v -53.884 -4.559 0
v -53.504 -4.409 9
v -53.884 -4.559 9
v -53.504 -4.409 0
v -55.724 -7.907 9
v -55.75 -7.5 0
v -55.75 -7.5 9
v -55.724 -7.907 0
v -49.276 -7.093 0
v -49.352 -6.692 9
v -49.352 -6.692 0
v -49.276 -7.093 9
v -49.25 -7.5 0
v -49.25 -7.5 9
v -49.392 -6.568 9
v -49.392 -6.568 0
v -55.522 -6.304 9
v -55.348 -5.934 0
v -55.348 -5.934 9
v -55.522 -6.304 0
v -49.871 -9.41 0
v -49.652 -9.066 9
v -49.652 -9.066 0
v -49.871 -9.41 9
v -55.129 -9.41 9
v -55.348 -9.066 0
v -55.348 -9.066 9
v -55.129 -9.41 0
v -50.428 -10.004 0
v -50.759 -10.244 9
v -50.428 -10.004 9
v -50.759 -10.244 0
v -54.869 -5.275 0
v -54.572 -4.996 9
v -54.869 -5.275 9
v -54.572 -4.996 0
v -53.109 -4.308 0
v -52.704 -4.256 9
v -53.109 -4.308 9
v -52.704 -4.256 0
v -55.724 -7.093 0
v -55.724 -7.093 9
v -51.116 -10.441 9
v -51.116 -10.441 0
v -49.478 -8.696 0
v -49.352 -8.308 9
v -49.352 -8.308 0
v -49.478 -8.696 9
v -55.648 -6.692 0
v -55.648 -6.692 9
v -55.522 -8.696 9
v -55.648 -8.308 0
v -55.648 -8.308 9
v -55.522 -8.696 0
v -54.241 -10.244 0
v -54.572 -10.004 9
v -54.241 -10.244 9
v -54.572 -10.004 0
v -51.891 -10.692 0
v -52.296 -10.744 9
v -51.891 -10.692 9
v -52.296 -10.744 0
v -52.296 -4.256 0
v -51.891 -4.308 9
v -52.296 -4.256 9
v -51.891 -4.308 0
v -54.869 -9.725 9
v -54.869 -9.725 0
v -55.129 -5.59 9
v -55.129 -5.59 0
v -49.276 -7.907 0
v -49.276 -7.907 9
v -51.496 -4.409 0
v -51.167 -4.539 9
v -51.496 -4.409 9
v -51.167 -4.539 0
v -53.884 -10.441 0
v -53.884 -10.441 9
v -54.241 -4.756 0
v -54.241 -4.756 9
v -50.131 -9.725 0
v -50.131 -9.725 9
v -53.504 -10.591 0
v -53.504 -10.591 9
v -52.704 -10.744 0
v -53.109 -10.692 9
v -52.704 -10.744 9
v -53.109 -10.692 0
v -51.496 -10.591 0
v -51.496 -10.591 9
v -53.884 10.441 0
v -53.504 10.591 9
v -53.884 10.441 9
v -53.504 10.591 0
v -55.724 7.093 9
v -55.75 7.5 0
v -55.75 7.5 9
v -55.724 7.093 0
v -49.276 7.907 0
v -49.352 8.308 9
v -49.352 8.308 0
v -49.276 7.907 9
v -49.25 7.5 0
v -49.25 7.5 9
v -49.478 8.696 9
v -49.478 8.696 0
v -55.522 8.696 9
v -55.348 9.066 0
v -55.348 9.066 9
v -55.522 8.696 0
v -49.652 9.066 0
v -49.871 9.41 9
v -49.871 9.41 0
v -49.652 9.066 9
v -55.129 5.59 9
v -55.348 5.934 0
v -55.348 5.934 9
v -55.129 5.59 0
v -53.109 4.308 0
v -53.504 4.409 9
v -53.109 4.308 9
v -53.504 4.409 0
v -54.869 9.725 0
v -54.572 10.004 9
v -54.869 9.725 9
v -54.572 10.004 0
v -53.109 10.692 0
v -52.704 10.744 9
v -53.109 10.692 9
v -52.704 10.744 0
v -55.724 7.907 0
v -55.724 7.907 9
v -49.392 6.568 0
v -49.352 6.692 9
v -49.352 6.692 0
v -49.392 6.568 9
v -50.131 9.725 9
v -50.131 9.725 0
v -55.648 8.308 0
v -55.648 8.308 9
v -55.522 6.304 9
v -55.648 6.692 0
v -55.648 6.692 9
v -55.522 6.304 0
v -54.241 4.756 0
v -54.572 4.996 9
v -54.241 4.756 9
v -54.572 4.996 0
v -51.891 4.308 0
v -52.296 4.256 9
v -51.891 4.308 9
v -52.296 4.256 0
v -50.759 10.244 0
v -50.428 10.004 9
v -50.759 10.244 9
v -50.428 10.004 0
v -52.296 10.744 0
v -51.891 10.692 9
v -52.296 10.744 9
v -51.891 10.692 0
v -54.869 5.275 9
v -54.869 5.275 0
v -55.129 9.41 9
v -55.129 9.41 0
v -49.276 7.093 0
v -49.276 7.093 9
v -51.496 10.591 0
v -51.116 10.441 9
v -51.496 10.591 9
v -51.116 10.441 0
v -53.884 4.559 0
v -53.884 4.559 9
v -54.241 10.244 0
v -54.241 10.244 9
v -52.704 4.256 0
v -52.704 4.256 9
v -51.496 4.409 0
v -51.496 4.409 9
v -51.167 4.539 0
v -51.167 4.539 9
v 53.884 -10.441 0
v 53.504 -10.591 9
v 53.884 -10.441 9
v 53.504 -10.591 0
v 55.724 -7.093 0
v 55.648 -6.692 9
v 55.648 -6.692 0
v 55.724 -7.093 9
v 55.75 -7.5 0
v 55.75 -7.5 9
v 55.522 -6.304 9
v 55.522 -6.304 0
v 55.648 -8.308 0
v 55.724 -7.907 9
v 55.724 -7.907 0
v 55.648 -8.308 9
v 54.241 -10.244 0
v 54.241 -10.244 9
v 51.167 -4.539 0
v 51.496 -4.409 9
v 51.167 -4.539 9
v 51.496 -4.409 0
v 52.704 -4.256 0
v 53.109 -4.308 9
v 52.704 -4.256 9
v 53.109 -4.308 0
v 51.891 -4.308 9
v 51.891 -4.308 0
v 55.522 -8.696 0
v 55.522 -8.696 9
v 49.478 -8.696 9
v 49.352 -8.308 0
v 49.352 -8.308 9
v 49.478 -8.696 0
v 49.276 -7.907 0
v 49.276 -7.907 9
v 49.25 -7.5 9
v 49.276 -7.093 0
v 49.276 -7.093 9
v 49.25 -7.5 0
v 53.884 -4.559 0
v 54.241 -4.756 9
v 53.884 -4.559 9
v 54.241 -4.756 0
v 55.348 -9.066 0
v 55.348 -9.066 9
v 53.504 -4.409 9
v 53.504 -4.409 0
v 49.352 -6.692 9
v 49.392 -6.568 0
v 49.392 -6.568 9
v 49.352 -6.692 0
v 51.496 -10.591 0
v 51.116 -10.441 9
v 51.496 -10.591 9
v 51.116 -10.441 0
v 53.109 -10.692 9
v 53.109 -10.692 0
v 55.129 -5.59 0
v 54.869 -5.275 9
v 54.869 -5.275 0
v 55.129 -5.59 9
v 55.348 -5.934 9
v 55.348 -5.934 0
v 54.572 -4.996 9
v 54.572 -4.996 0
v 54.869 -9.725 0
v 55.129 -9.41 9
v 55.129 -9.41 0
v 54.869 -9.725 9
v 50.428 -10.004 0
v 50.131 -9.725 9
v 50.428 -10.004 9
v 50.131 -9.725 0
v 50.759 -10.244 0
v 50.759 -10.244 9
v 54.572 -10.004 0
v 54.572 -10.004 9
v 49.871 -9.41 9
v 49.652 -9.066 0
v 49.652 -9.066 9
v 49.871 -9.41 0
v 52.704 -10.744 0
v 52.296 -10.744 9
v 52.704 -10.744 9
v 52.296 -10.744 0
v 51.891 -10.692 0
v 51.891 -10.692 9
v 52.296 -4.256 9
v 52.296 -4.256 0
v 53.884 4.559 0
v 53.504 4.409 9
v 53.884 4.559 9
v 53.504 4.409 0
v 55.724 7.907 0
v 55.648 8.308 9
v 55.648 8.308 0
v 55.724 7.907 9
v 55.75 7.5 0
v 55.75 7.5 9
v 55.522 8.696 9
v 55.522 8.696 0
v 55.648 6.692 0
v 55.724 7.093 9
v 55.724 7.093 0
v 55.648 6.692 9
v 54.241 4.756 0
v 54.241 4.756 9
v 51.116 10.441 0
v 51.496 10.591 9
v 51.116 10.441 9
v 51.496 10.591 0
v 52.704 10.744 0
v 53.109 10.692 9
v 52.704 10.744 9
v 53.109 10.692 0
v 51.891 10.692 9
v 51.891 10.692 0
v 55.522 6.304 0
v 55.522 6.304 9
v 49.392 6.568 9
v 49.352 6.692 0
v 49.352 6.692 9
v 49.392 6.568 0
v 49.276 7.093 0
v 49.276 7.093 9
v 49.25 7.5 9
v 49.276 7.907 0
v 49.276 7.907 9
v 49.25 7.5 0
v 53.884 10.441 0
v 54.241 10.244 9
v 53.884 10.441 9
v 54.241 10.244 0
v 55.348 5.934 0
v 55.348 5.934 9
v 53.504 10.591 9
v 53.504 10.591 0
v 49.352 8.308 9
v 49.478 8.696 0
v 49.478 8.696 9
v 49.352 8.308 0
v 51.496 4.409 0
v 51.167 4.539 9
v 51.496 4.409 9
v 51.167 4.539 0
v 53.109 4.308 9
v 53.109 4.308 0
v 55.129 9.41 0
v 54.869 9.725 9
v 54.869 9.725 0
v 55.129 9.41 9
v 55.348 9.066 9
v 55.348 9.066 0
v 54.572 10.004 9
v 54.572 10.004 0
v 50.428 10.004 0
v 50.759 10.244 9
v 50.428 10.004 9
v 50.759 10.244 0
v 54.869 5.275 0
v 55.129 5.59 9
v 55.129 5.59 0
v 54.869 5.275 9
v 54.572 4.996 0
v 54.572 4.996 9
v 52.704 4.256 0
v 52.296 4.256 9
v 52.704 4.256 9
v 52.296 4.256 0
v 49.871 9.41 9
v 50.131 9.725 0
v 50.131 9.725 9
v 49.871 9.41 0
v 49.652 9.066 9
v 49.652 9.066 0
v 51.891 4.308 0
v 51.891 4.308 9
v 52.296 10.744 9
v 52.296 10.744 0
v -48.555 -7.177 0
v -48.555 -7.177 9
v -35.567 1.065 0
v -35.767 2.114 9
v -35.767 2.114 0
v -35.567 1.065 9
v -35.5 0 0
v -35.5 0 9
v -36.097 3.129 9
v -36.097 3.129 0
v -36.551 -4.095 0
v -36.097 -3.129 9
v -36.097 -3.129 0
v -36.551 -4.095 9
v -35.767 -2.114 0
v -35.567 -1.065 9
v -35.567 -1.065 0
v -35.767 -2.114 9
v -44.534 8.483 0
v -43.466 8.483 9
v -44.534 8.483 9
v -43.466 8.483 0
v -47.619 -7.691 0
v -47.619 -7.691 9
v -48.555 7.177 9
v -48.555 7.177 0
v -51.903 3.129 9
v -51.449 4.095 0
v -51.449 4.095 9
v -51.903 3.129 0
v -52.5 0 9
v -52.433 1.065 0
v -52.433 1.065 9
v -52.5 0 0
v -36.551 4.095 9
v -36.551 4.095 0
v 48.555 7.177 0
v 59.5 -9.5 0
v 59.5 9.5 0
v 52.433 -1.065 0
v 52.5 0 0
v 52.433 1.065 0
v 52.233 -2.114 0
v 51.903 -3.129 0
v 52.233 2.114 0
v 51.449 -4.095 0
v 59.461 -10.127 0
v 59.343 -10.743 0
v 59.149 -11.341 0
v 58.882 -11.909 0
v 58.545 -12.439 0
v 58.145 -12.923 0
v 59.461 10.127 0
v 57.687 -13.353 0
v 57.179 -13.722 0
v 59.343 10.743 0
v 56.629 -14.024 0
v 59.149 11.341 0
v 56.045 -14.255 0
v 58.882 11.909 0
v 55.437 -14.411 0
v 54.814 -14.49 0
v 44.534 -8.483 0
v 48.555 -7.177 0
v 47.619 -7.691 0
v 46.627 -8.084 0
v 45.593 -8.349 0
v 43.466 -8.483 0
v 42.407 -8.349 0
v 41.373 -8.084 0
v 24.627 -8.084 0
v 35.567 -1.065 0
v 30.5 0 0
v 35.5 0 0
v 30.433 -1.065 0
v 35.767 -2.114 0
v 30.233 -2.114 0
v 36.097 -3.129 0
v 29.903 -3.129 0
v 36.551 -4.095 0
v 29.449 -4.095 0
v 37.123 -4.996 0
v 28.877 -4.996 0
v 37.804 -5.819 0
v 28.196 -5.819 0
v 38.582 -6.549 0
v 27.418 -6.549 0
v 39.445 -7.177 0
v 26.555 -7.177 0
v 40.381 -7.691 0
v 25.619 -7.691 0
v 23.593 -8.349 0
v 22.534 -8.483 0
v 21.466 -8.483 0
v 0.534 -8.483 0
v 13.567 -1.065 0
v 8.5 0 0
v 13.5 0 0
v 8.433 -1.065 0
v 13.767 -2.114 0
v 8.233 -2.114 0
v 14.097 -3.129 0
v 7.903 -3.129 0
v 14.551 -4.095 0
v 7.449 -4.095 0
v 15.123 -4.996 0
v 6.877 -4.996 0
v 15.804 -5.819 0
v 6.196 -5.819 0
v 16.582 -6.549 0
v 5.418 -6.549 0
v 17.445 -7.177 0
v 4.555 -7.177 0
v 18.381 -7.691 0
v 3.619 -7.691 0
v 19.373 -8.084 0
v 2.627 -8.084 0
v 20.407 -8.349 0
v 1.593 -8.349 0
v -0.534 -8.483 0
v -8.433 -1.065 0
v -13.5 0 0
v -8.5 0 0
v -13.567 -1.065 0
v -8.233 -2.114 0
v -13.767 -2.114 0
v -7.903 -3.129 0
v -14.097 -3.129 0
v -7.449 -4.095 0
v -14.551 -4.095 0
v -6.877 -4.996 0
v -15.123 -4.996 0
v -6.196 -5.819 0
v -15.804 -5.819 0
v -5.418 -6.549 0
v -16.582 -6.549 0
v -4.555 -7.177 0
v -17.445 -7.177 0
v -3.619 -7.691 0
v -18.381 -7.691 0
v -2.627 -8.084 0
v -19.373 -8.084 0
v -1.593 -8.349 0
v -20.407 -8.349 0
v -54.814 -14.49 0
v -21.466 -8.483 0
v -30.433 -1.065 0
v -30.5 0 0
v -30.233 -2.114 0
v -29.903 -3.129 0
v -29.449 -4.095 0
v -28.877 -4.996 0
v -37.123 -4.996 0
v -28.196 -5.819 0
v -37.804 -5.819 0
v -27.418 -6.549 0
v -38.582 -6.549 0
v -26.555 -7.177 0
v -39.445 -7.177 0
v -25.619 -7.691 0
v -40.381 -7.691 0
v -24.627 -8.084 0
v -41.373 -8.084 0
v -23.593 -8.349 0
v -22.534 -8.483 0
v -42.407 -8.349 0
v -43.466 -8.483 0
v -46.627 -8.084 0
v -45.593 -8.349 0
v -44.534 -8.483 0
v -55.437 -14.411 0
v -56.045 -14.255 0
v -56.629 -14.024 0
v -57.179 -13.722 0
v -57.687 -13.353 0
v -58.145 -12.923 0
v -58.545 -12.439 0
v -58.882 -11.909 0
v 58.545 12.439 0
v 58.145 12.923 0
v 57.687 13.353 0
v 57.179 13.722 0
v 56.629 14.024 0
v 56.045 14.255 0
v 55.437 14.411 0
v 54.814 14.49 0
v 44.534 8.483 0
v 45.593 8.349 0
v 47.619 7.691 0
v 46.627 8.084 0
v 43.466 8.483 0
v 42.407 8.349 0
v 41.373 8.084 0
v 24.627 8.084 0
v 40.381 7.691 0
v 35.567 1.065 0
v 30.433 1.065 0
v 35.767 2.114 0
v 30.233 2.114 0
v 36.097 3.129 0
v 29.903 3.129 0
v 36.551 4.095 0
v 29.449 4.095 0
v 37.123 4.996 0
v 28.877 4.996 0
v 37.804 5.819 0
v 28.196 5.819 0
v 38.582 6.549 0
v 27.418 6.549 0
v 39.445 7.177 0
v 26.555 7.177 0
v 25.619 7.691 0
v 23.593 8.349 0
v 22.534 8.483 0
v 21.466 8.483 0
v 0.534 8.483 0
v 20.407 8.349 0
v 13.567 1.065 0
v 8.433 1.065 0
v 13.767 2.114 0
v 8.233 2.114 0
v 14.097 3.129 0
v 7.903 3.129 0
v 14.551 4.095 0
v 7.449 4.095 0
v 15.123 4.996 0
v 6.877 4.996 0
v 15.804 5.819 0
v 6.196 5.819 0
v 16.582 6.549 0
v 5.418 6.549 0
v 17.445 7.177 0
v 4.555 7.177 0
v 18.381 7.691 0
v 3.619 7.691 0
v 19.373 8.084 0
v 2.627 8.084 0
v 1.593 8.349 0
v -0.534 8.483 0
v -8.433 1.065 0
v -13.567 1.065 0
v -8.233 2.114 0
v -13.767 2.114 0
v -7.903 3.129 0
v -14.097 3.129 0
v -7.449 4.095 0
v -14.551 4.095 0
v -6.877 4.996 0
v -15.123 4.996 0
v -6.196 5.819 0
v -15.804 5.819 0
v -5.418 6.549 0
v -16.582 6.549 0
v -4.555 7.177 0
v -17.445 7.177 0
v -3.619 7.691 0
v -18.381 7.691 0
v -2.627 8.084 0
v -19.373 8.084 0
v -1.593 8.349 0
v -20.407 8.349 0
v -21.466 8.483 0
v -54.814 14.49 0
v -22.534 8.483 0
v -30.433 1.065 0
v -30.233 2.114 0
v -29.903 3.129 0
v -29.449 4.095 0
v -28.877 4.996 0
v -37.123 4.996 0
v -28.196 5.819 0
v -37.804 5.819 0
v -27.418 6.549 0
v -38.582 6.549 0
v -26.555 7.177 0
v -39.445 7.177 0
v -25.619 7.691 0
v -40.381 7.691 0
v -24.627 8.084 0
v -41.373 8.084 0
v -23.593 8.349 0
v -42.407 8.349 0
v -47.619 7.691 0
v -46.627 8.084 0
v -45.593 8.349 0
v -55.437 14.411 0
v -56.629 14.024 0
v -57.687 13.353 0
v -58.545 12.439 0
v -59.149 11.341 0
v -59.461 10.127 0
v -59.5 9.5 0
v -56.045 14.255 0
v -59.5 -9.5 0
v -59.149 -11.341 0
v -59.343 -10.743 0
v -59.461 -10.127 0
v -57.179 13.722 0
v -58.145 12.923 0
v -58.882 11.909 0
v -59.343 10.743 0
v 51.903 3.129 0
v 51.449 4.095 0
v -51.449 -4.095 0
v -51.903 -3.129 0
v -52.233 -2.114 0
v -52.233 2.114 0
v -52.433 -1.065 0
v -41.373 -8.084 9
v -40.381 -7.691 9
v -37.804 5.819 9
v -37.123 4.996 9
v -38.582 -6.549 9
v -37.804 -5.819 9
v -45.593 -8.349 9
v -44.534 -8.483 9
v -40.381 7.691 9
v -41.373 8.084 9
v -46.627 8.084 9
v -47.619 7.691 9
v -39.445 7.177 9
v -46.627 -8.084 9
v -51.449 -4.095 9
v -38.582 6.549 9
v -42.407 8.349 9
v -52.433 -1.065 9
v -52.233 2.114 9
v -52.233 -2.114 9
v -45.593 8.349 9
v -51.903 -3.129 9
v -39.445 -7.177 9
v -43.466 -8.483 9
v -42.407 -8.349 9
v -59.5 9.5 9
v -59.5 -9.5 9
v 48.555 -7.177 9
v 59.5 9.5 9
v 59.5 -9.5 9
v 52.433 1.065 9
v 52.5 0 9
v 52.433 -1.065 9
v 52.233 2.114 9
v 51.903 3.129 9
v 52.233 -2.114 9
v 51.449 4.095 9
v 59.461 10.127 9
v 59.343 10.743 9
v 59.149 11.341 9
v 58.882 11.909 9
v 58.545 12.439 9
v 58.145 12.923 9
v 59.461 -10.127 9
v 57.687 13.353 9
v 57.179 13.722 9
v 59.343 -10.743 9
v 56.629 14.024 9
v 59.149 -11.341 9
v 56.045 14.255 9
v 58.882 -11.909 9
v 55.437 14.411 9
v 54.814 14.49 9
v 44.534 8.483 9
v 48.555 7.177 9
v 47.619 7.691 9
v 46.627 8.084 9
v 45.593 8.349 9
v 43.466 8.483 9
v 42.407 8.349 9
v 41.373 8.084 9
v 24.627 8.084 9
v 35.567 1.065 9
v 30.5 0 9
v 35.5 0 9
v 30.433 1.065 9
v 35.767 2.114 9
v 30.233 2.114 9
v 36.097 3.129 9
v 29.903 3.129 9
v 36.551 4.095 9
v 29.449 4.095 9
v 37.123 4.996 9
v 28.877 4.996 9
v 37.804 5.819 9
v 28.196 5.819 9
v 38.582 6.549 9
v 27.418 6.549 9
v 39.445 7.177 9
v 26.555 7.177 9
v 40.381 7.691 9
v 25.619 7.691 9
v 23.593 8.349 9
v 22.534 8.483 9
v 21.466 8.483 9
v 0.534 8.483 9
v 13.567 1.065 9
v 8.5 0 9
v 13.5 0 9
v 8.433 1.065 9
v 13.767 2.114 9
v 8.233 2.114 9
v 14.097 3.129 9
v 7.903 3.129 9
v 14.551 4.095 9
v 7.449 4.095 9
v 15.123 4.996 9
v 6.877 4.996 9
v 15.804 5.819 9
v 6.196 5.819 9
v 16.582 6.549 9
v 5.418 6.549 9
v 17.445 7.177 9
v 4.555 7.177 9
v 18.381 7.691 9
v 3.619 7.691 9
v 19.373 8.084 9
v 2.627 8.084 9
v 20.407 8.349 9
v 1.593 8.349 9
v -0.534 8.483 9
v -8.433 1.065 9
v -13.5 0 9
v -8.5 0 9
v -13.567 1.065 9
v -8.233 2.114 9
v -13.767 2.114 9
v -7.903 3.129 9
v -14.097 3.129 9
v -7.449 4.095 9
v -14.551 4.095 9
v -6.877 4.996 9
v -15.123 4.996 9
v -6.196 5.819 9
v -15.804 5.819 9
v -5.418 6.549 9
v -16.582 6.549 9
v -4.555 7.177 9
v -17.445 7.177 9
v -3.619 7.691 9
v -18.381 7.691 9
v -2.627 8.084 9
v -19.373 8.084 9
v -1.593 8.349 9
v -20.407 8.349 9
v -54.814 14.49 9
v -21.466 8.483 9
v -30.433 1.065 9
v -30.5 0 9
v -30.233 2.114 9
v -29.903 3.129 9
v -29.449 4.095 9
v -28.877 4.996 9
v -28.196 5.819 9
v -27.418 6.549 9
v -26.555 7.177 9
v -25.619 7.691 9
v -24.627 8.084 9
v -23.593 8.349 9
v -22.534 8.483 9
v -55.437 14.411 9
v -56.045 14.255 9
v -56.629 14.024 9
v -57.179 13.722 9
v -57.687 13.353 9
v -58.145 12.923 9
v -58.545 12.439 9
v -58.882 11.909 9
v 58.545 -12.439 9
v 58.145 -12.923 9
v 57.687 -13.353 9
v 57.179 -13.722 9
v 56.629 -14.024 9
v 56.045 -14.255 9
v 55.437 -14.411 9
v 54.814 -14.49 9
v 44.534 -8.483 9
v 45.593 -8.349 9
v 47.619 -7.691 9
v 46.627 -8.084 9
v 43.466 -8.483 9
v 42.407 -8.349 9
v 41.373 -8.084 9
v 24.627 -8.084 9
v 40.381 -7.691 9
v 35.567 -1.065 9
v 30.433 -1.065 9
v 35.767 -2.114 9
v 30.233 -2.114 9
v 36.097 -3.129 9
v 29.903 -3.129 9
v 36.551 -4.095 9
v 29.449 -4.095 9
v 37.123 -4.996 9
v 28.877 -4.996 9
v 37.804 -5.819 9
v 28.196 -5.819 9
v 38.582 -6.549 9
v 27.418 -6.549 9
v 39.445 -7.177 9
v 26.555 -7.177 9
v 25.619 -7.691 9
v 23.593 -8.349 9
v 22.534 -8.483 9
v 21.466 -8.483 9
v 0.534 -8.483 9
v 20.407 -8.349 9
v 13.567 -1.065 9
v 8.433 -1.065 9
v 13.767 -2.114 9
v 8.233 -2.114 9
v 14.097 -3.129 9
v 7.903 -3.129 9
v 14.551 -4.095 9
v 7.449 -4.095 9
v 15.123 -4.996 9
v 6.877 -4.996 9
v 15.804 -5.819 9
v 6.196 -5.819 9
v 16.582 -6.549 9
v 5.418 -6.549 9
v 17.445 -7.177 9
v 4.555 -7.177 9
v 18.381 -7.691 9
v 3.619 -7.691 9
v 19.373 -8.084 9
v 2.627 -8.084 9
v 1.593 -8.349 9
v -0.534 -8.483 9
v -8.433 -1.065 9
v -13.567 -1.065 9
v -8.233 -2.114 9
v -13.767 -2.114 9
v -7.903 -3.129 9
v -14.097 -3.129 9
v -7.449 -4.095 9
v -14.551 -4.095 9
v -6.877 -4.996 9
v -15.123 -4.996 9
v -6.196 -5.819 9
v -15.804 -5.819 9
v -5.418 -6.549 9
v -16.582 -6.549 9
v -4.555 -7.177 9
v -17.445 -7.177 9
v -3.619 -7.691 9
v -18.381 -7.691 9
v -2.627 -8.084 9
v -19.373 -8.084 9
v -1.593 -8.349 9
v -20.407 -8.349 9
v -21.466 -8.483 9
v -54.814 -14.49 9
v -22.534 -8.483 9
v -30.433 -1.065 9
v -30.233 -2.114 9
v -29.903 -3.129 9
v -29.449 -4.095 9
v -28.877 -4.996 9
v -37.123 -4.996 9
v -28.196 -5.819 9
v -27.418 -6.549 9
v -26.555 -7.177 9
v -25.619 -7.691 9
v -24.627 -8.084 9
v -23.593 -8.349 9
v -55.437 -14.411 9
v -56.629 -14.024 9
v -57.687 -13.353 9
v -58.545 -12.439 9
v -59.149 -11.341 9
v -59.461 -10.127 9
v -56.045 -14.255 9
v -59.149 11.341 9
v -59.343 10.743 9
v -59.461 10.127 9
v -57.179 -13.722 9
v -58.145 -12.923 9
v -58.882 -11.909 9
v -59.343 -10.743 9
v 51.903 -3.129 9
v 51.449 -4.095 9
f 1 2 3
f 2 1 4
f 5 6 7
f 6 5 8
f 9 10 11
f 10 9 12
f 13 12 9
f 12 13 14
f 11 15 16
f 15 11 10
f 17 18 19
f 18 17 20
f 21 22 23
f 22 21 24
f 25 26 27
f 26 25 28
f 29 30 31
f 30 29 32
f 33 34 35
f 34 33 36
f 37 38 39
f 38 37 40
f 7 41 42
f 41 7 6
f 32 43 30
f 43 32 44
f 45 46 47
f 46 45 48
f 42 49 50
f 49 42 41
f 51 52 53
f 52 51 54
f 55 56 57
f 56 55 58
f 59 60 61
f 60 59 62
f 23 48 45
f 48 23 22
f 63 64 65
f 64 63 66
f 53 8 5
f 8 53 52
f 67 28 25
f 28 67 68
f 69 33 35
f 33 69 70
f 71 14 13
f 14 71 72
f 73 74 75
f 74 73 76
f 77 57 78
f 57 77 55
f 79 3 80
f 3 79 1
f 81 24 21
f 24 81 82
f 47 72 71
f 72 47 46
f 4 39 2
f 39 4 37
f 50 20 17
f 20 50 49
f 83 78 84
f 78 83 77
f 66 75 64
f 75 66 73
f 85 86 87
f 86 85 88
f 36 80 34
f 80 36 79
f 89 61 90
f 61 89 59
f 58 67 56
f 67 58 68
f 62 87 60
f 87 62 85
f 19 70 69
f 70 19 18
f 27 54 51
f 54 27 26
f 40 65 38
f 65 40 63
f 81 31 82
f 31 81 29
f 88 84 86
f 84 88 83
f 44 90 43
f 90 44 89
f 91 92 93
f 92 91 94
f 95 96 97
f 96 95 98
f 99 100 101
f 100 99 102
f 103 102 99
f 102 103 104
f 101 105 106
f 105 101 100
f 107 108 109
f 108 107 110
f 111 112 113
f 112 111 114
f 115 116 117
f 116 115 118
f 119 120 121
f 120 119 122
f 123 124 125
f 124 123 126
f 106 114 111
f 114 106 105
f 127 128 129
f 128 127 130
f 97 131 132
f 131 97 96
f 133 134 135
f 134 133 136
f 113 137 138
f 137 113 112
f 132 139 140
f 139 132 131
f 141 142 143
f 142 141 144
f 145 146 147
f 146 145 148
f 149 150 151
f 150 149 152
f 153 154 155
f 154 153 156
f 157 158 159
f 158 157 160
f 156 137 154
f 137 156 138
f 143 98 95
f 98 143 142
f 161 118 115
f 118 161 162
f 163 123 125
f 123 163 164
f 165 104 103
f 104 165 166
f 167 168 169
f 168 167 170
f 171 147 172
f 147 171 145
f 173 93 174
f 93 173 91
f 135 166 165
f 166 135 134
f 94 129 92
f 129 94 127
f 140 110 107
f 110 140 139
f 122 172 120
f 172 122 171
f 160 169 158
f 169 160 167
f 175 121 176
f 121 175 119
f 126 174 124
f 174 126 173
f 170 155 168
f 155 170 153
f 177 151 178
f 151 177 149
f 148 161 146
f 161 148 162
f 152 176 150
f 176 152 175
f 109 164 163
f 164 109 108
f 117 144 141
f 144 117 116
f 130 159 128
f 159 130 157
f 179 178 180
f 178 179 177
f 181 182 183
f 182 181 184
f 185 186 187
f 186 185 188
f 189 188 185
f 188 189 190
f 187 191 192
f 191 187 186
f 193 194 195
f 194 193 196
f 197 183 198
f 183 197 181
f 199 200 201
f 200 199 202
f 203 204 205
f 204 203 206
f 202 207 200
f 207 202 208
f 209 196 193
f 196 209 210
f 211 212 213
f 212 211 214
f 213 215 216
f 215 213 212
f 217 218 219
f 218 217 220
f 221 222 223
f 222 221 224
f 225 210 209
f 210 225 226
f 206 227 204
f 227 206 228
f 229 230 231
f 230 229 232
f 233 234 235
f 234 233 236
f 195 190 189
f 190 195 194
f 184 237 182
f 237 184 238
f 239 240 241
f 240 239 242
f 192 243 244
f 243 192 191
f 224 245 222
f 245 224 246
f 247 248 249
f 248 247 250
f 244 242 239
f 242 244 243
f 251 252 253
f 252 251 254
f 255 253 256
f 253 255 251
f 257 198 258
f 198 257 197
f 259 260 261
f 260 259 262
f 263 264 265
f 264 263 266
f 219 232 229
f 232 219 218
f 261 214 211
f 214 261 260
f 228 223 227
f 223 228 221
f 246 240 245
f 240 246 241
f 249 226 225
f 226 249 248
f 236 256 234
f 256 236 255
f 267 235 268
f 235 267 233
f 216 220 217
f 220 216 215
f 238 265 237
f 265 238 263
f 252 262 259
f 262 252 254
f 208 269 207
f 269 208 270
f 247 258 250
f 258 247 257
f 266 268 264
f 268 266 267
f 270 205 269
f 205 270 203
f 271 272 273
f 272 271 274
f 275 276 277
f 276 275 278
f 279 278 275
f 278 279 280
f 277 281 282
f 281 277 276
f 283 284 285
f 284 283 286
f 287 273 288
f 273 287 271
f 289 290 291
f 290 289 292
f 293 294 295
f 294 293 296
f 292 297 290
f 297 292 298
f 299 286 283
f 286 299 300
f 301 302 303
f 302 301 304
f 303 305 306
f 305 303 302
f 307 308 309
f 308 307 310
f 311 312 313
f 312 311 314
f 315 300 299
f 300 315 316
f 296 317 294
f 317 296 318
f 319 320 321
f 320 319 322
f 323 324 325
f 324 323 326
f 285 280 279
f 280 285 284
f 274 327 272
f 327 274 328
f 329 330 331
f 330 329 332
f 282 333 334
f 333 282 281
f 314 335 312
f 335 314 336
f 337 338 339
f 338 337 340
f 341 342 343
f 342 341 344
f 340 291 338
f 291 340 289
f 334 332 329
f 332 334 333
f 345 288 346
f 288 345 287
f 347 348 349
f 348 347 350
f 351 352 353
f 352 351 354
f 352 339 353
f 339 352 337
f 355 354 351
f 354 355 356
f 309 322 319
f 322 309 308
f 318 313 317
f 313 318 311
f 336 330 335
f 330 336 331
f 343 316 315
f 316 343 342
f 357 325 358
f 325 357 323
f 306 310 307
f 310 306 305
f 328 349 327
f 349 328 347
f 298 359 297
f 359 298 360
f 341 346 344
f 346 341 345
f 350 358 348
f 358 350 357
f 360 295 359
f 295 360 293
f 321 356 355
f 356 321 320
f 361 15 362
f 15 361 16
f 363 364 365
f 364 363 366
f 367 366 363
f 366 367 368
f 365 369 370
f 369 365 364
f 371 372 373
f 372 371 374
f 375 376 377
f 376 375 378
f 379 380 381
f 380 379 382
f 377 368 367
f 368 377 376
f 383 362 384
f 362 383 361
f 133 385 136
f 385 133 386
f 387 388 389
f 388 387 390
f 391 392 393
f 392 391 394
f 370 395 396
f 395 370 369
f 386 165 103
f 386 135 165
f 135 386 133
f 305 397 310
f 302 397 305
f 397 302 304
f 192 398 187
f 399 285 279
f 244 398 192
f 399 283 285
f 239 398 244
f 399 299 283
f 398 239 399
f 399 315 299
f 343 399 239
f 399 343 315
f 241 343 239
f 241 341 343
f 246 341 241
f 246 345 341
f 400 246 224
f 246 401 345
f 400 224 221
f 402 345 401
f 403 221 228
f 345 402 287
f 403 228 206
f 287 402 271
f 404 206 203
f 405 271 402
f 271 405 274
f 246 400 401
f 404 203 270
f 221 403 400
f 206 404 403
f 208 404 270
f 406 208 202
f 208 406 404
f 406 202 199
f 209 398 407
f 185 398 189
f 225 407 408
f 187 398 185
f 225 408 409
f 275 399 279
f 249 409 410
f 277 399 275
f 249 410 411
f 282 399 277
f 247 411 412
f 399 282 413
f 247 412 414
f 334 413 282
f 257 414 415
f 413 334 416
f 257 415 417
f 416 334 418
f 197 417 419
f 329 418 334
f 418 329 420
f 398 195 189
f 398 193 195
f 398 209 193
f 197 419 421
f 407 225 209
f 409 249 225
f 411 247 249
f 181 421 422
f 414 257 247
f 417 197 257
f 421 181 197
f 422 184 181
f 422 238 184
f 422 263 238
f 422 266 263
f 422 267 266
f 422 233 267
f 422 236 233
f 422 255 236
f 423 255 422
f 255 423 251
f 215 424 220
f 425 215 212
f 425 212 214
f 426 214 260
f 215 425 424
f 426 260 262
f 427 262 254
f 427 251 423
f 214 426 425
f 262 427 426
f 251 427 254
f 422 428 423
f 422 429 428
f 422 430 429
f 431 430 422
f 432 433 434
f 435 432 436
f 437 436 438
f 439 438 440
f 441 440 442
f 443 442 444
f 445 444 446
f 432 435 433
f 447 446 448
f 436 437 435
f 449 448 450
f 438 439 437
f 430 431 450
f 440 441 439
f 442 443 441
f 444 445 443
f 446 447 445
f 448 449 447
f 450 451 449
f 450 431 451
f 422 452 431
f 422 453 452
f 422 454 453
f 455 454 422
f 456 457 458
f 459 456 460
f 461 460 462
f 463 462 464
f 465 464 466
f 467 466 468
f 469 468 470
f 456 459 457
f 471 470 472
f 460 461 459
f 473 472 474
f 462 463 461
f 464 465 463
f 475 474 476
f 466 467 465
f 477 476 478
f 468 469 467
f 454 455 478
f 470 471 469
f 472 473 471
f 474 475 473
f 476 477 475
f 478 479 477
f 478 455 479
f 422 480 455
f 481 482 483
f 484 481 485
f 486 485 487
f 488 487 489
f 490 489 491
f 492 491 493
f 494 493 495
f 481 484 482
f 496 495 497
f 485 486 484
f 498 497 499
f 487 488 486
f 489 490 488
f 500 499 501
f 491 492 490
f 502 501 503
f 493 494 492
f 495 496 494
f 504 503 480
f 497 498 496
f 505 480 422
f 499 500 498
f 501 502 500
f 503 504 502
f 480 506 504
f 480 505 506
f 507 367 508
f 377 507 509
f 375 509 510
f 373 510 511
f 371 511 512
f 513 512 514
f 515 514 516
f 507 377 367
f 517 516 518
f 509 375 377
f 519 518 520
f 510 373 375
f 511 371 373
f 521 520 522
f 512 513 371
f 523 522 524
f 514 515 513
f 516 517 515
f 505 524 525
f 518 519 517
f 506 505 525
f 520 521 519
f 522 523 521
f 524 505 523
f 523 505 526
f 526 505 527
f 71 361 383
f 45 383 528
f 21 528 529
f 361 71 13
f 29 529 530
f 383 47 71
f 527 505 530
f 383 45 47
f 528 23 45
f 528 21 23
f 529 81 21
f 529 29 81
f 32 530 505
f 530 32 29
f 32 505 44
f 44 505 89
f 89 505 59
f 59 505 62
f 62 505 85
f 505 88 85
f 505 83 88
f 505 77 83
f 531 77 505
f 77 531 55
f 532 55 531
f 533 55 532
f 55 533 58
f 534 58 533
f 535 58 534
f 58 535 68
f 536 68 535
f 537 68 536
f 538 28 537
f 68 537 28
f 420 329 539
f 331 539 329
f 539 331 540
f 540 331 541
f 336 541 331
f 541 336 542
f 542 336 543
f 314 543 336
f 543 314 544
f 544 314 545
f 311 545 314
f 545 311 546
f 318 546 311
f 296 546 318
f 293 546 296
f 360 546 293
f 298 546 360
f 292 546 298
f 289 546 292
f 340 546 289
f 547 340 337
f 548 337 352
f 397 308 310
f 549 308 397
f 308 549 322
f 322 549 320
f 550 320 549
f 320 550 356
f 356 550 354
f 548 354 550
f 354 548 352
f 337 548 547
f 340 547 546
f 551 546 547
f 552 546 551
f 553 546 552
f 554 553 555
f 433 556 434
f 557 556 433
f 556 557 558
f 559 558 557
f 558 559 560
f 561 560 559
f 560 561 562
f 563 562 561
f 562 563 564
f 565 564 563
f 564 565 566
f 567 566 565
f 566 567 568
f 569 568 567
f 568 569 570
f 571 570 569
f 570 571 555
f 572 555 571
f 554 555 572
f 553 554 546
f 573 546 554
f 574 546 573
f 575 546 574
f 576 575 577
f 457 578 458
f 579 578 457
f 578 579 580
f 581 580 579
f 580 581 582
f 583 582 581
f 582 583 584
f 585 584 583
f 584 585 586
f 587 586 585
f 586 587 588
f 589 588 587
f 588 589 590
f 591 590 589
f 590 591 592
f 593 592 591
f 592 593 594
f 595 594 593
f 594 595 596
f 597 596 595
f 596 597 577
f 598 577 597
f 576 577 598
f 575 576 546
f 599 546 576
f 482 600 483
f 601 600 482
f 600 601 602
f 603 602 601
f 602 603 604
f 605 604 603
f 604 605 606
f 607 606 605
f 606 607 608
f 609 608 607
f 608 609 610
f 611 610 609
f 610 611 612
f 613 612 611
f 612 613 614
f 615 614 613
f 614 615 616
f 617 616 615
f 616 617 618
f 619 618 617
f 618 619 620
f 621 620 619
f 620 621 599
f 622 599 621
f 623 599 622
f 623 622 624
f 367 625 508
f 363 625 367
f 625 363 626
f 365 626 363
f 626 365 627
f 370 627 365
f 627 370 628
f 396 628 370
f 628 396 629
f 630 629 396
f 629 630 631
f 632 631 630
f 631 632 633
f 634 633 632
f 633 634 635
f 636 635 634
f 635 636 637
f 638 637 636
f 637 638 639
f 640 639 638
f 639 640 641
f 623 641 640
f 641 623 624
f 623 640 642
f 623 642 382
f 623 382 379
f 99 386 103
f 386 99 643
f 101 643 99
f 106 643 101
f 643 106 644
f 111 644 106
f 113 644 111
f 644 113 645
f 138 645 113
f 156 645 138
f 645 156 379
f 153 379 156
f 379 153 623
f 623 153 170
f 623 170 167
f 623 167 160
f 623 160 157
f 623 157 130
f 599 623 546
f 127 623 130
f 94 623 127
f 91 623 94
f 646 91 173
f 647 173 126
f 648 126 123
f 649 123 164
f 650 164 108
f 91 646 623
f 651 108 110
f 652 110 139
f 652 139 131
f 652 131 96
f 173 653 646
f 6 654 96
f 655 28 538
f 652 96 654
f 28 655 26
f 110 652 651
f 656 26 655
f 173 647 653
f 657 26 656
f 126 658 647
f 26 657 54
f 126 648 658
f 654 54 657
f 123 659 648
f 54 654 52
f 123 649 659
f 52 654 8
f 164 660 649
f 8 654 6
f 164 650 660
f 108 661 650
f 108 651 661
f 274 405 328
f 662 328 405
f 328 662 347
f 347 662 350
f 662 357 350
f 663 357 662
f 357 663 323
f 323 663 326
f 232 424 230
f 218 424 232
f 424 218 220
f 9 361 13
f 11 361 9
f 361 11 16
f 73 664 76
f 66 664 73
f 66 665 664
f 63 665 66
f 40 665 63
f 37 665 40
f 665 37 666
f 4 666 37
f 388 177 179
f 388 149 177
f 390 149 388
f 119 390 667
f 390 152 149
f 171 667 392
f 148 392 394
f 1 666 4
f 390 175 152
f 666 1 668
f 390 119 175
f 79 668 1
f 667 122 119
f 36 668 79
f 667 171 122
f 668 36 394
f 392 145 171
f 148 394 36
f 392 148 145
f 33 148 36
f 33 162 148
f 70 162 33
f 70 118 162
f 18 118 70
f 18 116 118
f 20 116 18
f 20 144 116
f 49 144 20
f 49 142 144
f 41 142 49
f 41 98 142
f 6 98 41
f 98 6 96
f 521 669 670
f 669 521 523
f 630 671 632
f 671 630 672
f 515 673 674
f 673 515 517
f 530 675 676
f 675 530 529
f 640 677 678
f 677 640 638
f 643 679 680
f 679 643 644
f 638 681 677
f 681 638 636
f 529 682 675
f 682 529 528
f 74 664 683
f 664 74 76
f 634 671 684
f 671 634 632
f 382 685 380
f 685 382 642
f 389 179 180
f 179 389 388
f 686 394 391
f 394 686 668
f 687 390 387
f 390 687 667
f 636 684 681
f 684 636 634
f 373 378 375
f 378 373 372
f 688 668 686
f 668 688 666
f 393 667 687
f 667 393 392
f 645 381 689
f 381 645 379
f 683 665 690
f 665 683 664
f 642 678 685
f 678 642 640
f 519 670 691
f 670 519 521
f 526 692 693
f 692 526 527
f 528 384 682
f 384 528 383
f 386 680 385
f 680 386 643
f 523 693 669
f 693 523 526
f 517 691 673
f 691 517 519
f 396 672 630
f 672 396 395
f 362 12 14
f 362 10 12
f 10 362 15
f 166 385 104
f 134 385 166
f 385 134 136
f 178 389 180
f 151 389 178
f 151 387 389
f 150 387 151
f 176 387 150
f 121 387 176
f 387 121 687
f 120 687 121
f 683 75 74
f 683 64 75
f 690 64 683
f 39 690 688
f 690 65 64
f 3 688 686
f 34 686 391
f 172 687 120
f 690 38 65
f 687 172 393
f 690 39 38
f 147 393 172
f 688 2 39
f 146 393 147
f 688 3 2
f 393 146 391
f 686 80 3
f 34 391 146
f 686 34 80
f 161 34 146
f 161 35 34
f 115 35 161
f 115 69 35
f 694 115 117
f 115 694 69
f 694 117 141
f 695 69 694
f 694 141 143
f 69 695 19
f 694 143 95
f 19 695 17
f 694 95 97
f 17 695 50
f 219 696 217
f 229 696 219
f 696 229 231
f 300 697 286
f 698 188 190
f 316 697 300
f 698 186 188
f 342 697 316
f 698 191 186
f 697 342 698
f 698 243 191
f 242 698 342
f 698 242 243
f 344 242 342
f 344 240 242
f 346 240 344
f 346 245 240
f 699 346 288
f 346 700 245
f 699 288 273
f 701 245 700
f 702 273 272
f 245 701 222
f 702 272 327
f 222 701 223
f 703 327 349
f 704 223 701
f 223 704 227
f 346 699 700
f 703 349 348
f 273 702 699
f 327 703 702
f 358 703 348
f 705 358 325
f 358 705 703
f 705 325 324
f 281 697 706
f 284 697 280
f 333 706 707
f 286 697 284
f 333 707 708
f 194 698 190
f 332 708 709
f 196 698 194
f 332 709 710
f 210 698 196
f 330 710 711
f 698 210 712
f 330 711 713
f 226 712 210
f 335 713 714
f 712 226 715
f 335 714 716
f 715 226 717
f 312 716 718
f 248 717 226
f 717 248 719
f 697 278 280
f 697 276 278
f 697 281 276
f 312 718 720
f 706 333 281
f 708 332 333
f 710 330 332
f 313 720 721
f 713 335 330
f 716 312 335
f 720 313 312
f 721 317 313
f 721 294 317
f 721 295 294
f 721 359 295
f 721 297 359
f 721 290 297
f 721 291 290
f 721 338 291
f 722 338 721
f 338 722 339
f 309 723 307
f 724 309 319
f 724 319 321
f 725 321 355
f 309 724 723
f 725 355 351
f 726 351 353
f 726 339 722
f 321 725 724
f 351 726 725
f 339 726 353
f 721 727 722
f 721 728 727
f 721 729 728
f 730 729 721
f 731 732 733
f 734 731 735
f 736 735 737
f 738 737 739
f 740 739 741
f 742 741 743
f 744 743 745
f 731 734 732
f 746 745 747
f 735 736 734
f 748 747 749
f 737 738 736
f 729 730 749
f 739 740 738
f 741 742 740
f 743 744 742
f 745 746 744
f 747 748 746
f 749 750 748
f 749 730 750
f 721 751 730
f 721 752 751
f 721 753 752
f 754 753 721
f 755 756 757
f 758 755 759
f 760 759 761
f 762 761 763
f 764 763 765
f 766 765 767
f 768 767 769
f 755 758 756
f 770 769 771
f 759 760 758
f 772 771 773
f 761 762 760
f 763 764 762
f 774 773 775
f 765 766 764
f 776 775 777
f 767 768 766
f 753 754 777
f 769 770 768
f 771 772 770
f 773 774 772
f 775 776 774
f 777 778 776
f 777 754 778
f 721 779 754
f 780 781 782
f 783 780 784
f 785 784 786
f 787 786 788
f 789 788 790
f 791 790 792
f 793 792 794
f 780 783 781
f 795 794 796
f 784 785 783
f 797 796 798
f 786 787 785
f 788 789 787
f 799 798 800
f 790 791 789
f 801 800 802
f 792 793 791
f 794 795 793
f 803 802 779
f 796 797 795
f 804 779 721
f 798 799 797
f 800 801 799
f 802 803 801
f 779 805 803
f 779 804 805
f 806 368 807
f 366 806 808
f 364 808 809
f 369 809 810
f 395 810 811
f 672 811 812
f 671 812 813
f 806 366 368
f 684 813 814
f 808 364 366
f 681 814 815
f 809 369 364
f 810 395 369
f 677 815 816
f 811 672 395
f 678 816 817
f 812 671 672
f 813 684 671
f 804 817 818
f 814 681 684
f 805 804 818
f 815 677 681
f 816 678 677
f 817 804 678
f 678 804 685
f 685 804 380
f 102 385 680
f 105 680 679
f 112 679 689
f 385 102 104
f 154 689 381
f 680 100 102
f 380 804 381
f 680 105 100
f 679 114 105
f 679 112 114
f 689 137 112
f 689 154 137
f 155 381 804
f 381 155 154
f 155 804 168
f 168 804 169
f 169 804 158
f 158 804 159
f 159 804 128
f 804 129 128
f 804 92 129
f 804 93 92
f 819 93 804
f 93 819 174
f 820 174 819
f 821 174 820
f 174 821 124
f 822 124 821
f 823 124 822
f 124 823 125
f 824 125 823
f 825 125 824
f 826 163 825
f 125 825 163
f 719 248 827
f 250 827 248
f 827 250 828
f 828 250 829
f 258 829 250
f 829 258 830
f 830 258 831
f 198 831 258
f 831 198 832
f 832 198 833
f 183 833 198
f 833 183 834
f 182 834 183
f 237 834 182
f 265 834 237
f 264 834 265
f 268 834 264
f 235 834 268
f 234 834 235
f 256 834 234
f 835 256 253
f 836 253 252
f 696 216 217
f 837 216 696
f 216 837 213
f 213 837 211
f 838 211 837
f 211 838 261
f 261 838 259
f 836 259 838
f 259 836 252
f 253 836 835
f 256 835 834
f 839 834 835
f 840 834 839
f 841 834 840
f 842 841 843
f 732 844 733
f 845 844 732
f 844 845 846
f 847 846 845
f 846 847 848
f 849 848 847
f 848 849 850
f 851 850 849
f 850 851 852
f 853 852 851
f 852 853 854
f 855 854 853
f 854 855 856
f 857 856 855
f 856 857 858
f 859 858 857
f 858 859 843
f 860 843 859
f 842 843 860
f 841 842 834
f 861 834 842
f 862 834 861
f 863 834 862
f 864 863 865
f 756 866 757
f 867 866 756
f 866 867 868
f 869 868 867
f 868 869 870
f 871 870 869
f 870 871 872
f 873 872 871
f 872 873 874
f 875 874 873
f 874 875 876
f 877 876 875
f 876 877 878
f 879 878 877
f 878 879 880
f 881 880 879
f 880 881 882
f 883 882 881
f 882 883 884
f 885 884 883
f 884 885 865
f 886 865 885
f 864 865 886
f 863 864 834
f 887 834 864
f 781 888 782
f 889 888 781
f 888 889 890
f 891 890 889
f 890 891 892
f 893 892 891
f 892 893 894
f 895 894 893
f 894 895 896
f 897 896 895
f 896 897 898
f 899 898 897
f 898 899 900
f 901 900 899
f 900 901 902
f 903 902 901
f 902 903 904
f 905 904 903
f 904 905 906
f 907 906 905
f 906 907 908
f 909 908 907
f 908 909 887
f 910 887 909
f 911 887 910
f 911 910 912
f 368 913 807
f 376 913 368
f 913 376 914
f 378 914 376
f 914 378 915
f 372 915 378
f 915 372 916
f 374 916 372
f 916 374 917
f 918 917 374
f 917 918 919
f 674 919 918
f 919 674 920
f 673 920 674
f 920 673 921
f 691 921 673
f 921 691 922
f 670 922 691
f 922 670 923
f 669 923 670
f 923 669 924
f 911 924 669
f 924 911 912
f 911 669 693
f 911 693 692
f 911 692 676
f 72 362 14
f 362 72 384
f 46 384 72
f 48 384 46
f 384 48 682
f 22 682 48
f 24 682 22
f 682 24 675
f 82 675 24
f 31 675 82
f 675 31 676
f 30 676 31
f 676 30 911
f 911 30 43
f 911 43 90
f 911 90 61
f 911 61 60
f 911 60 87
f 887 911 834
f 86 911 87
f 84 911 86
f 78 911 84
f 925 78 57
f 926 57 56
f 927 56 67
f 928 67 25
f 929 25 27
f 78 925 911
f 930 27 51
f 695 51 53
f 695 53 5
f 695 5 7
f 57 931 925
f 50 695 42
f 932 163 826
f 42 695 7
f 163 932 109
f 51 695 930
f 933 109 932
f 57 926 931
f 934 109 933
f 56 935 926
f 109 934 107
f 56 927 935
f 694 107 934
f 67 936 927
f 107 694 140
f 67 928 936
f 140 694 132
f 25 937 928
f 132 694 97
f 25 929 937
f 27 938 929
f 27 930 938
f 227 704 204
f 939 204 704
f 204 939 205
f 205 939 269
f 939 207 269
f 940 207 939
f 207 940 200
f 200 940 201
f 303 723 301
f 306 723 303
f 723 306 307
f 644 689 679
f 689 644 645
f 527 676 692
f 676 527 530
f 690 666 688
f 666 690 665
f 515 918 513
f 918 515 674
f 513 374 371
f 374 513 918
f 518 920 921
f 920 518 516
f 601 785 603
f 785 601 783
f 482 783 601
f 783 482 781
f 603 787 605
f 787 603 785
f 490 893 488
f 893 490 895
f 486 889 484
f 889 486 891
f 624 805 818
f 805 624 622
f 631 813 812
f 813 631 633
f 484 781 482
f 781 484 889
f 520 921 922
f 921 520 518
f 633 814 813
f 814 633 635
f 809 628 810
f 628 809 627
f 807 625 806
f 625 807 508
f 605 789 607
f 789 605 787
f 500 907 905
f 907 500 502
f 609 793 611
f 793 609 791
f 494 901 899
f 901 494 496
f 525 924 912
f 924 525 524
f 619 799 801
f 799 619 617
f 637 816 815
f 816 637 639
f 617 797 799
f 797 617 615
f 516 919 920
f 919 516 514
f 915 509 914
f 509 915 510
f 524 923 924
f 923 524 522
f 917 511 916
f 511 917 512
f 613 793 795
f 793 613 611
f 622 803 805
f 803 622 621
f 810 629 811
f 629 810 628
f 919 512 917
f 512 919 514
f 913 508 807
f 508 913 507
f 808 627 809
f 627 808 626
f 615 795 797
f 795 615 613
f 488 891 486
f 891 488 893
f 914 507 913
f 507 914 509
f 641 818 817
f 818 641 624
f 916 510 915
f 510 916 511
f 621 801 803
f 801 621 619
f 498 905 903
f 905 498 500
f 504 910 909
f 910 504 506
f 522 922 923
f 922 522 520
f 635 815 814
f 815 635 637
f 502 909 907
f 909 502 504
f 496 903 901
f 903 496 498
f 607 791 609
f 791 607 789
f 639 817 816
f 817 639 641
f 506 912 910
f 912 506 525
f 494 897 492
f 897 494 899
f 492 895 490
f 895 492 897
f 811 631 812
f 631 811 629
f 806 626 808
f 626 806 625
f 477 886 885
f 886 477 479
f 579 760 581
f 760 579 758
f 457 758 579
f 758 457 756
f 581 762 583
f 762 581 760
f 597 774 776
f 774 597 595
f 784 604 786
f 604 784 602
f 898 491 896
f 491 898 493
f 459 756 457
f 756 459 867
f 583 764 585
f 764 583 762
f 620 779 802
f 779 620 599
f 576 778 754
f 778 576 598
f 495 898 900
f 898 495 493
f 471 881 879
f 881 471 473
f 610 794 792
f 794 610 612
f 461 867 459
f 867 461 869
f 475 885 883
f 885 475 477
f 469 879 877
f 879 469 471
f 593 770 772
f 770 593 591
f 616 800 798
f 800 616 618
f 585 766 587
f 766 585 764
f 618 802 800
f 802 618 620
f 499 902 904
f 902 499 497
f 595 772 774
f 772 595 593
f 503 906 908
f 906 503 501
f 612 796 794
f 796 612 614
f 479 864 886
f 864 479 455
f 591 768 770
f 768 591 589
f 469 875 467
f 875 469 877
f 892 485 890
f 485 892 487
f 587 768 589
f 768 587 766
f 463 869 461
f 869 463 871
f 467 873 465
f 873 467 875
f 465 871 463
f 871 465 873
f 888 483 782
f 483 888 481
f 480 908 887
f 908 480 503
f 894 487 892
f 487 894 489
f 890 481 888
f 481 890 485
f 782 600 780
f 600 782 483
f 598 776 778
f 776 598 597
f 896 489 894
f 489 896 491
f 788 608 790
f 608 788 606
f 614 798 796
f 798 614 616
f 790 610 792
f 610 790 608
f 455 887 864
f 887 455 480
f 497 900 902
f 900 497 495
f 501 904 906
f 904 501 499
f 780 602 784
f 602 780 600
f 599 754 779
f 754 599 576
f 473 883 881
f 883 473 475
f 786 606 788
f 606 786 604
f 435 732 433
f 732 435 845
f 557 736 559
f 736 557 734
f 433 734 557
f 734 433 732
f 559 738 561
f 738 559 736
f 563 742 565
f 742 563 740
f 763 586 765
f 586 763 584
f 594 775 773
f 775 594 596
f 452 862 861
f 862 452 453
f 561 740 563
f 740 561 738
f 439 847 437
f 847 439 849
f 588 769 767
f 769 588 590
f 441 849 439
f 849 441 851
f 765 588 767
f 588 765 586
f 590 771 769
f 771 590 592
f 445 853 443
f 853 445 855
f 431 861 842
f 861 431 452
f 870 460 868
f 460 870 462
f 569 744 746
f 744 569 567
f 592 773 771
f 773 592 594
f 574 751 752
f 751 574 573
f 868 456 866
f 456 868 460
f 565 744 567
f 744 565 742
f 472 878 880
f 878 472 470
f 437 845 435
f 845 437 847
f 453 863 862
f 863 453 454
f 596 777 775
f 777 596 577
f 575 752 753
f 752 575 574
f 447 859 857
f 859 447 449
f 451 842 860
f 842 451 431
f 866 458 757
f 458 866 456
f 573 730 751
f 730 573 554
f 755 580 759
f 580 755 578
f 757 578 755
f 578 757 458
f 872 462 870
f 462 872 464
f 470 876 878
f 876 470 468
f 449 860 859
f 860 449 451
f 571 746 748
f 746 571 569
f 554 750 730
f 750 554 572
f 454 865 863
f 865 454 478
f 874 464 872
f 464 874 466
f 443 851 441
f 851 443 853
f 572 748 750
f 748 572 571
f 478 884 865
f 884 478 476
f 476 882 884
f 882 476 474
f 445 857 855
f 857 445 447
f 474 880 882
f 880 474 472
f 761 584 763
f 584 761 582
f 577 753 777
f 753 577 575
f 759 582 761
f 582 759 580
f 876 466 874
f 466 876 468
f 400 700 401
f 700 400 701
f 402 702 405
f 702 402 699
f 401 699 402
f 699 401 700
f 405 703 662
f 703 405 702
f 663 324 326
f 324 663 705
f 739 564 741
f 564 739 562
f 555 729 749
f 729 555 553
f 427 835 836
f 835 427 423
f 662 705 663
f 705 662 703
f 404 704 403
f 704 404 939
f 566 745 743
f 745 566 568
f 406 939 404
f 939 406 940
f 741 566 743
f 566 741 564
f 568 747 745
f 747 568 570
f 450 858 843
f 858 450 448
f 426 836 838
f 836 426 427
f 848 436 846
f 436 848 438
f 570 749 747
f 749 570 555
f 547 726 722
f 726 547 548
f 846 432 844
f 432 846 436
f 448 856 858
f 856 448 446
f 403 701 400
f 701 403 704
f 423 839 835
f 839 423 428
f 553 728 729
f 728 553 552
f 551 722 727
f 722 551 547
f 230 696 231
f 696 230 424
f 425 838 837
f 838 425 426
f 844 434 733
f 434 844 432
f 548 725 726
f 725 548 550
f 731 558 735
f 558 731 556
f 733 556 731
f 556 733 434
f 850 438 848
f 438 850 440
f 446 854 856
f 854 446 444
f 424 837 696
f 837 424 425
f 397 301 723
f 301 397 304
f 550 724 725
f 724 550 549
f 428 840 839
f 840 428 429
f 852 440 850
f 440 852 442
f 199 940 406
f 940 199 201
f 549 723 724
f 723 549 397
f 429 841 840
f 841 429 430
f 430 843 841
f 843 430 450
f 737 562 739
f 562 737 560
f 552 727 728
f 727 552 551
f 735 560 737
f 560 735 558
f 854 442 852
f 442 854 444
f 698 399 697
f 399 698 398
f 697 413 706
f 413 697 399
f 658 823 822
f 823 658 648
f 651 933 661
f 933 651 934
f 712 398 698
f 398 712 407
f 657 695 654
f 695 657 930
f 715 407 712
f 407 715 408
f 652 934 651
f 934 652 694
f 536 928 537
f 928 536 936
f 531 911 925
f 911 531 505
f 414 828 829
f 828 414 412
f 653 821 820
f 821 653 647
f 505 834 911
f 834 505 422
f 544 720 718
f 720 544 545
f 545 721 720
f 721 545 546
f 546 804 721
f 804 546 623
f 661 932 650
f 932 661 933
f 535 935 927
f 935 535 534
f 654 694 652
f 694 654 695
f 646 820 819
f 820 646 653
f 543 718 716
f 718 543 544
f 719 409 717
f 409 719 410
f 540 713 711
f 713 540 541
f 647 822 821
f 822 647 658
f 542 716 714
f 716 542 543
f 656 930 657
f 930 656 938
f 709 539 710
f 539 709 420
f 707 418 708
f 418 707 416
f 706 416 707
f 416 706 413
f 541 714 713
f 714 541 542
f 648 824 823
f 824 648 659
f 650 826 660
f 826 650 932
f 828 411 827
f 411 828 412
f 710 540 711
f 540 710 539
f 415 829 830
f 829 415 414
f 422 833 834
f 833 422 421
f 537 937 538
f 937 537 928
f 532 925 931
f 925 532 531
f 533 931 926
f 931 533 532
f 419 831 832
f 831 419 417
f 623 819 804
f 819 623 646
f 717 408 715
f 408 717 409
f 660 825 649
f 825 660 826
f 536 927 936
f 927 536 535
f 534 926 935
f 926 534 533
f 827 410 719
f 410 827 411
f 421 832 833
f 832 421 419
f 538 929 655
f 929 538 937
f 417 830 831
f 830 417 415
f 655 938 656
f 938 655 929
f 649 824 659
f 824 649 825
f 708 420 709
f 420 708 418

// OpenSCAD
$fn = 50;


difference() {
	union() {
		hull() {
			translate(v = [-54.5000000000, 9.5000000000, 0]) {
				cylinder(h = 9, r = 5);
			}
			translate(v = [54.5000000000, 9.5000000000, 0]) {
				cylinder(h = 9, r = 5);
			}
			translate(v = [-54.5000000000, -9.5000000000, 0]) {
				cylinder(h = 9, r = 5);
			}
			translate(v = [54.5000000000, -9.5000000000, 0]) {
				cylinder(h = 9, r = 5);
			}
		}
	}
	union() {
		#translate(v = [-52.5000000000, -7.5000000000, -100.0000000000]) {
			cylinder(h = 200, r = 3.2500000000);
		}
		#translate(v = [-52.5000000000, 7.5000000000, -100.0000000000]) {
			cylinder(h = 200, r = 3.2500000000);
		}
		#translate(v = [52.5000000000, -7.5000000000, -100.0000000000]) {
			cylinder(h = 200, r = 3.2500000000);
		}
		#translate(v = [52.5000000000, 7.5000000000, -100.0000000000]) {
			cylinder(h = 200, r = 3.2500000000);
		}
		#translate(v = [-44.0000000000, 0, 0]) {
			cylinder(h = 9, r = 8.5000000000);
		}
		#translate(v = [-22.0000000000, 0, 0]) {
			cylinder(h = 9, r = 8.5000000000);
		}
		#cylinder(h = 9, r = 8.5000000000);
		#translate(v = [22.0000000000, 0, 0]) {
			cylinder(h = 9, r = 8.5000000000);
		}
		#translate(v = [44.0000000000, 0, 0]) {
			cylinder(h = 9, r = 8.5000000000);
		}
	}
}
